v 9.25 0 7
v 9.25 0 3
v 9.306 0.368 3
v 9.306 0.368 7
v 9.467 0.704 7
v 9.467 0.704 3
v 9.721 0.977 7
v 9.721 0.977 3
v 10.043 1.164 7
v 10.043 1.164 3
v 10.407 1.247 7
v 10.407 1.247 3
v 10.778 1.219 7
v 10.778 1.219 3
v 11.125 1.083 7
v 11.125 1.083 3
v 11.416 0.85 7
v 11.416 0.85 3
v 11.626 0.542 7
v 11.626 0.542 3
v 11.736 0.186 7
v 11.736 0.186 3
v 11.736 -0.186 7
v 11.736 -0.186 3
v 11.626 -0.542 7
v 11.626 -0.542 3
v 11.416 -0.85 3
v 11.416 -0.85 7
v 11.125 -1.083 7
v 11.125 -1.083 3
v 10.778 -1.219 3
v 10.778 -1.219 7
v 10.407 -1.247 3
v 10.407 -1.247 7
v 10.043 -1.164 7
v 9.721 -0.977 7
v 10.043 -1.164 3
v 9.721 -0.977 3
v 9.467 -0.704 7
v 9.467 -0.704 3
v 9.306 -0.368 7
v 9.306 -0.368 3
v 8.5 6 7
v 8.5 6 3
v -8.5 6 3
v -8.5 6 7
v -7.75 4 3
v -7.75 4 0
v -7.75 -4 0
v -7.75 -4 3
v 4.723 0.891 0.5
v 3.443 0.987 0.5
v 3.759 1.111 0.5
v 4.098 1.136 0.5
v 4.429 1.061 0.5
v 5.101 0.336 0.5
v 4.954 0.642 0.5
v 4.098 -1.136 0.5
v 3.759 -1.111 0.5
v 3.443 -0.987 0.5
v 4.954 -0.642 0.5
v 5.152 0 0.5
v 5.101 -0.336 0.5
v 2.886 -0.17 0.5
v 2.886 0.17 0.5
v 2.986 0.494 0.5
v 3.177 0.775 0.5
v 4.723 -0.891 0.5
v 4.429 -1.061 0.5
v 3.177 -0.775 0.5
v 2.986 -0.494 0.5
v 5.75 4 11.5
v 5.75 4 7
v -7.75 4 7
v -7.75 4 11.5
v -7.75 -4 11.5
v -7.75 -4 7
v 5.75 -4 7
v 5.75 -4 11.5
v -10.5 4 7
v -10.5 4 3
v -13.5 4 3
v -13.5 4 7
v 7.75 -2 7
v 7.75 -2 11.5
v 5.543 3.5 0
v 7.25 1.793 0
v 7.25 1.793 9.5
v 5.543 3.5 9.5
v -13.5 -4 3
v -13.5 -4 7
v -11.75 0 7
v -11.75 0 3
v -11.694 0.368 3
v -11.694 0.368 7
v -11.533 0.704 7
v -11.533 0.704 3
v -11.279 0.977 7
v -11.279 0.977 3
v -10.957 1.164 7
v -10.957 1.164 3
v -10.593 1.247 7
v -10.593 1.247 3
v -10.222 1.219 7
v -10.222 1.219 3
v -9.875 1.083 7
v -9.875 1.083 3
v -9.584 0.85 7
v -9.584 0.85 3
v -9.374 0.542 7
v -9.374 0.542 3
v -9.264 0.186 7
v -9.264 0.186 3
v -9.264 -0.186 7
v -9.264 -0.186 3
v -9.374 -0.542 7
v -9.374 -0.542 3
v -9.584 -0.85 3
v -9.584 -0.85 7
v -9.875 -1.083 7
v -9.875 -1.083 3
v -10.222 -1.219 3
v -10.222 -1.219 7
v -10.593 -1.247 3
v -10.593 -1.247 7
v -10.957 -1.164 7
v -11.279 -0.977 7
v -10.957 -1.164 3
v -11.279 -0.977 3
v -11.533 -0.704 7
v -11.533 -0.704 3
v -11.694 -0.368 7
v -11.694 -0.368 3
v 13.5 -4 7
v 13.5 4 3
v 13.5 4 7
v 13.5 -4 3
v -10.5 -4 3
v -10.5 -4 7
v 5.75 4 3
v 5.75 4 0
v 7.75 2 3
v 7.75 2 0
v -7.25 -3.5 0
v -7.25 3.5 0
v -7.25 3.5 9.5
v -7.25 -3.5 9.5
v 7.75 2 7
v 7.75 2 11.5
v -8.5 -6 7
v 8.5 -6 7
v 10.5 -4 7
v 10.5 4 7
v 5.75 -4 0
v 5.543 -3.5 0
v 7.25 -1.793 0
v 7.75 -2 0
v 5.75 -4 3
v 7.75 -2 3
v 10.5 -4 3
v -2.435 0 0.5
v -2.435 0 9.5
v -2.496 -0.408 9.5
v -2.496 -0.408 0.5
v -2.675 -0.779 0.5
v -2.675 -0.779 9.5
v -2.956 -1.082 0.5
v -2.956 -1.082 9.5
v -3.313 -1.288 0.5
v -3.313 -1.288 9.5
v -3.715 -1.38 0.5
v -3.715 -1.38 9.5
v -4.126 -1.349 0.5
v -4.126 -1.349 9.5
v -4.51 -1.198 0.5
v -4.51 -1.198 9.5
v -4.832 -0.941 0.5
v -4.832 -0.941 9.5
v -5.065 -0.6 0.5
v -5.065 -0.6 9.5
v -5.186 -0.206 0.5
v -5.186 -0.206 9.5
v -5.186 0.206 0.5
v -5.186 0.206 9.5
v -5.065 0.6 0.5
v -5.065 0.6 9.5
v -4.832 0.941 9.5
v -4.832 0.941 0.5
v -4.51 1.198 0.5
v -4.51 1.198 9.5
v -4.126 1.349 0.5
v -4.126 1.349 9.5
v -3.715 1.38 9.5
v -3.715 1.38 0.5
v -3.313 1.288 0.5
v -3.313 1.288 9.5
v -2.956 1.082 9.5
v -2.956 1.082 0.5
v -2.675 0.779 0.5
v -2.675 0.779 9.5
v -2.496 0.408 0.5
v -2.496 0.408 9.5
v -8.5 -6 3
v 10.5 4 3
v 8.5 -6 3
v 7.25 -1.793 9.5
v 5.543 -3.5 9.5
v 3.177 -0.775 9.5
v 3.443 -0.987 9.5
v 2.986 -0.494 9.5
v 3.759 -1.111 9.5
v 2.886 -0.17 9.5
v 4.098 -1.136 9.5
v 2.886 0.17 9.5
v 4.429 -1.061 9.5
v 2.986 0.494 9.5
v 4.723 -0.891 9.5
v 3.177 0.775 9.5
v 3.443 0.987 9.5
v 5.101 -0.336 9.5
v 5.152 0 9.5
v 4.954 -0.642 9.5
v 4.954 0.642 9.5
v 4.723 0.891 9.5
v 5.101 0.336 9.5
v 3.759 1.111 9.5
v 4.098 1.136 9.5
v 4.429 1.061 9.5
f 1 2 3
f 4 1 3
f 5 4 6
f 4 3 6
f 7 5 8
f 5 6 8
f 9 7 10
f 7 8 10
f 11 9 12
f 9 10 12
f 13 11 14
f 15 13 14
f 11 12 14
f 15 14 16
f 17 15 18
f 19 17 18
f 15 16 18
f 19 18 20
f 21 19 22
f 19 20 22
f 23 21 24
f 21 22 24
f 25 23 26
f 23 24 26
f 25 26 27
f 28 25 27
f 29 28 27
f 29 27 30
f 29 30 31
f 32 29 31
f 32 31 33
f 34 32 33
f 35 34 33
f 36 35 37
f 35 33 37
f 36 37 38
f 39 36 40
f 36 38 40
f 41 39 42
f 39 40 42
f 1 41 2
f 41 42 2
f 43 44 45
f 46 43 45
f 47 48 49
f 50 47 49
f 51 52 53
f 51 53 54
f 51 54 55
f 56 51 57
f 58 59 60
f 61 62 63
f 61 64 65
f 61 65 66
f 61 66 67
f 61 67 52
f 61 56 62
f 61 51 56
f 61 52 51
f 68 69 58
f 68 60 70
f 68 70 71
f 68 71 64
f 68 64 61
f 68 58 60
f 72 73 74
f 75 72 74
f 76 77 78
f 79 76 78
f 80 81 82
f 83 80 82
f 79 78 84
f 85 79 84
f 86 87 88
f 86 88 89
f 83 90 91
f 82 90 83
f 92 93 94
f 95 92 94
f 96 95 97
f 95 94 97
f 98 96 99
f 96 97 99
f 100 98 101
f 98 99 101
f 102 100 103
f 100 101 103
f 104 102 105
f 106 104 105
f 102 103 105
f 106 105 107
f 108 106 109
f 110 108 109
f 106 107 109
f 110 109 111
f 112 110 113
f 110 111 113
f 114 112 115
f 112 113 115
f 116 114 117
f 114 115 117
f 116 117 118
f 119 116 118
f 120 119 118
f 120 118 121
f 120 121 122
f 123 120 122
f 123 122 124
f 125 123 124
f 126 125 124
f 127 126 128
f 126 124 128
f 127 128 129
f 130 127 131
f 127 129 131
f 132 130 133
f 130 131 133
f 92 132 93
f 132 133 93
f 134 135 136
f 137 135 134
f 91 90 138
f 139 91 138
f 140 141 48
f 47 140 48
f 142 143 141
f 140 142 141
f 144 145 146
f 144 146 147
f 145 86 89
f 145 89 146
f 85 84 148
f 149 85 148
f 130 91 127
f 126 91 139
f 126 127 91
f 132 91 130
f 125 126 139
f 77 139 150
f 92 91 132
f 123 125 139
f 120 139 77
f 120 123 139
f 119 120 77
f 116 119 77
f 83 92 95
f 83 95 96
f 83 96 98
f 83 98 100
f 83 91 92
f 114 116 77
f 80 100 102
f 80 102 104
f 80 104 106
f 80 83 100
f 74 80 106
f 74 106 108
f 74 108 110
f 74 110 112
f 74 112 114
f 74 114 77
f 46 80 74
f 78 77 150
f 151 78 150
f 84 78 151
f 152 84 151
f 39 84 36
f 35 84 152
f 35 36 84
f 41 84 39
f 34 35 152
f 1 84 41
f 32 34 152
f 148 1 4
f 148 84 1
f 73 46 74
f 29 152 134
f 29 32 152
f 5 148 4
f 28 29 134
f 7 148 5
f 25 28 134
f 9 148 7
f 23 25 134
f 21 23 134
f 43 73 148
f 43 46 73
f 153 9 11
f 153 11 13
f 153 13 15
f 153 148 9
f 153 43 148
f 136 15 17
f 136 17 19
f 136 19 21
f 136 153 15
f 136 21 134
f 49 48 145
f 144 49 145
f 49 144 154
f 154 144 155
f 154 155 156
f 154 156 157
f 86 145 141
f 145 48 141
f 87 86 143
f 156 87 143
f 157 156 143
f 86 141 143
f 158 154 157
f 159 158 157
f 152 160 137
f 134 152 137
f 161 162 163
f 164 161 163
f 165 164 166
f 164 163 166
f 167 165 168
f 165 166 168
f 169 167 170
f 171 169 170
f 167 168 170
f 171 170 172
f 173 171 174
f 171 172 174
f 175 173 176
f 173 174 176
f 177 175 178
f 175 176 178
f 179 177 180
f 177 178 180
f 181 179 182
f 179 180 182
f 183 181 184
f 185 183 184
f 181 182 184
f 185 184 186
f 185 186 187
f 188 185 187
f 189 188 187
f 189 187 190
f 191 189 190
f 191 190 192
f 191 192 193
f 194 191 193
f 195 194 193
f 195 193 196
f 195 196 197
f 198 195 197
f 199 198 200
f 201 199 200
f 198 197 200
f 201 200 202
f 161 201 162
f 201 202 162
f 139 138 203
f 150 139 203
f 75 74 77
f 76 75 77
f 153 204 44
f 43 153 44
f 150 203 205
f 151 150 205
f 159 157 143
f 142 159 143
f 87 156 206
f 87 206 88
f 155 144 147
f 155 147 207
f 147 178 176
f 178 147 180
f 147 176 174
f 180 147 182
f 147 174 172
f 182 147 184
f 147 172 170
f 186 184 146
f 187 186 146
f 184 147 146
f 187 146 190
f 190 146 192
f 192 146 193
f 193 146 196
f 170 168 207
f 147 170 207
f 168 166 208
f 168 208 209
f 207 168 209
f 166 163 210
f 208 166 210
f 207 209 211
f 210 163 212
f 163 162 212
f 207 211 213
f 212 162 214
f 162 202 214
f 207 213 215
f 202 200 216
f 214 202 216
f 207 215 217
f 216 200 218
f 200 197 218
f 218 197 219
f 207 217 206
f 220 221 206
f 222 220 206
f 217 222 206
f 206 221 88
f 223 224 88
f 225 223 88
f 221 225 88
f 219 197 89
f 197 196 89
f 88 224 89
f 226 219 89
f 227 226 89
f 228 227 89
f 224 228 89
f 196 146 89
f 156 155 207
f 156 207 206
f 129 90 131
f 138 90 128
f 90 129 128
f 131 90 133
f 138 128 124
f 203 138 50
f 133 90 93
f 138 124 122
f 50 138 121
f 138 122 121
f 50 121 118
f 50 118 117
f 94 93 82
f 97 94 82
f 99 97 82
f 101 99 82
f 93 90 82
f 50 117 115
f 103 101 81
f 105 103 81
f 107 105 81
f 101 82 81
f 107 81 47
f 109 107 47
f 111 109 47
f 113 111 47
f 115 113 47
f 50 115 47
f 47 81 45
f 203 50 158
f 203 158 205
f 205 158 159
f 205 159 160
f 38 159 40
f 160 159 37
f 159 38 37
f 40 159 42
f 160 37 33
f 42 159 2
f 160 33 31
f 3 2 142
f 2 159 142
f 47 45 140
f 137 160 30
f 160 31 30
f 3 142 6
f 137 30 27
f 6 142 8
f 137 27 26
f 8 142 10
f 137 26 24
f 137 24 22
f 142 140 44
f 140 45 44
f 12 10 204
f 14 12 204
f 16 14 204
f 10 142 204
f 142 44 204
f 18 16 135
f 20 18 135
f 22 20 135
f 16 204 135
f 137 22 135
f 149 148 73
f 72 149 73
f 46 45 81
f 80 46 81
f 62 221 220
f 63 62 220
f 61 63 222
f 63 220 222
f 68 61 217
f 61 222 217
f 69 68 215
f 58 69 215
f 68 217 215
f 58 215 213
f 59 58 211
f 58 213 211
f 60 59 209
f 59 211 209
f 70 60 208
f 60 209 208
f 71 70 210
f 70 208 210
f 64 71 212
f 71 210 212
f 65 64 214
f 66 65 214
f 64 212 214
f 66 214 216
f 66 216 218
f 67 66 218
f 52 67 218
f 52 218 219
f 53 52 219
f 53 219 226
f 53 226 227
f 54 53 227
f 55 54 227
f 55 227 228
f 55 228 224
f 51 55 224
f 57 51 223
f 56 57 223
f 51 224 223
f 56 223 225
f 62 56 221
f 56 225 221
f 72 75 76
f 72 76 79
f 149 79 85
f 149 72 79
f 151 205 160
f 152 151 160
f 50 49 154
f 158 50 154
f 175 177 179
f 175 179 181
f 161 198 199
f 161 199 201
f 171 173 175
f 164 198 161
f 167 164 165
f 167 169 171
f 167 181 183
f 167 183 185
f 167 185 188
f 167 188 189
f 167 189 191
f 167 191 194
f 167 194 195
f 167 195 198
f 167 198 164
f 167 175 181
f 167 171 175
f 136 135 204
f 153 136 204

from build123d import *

# Parameters (mm, degrees)
BOSS_EXTRUDE1_DEPTH = 11.5
SKETCH2_R           = 1.25
BOSS_EXTRUDE2_DEPTH = 4
BOSS_EXTRUDE3_DEPTH = 2
SKETCH4_R           = 1.139512492
SKETCH4_R_2         = 1.383403708
BOSS_EXTRUDE4_DEPTH = 9


with BuildPart() as part:
    # Sketch1 → Boss-Extrude1 (new body)
    with BuildSketch(Plane.XY):
        Polygon((5.75, -4), (7.75, -2), (7.75, 2), (5.75, 4), (-7.75, 4), (-7.75, -4), align=None)
        Polygon((-7.25, 3.5), (-7.25, -3.5), (5.542893219, -3.5), (7.25, -1.792893219), (7.25, 1.792893219), (5.542893219, 3.5), align=None, mode=Mode.SUBTRACT)
    extrude(amount=BOSS_EXTRUDE1_DEPTH)

    # Sketch2 → Boss-Extrude2 (add)
    with BuildSketch(Plane(origin=(0, 0, 3), x_dir=(-1, 0, 0), z_dir=(0, 0, -1))):
        Polygon((-13.5, 0), (-13.5, 4), (-10.5, 4), (-8.5, 6), (8.5, 6), (10.5, 4), (13.5, 4), (13.5, 0), (13.5, -4), (10.5, -4), (8.5, -6), (-8.5, -6), (-10.5, -4), (-13.5, -4), align=None)
        with Locations((-10.5, 0)):
            Circle(SKETCH2_R, mode=Mode.SUBTRACT)
        with Locations((10.5, 0)):
            Circle(SKETCH2_R, mode=Mode.SUBTRACT)
        Polygon((-5.75, -4), (7.75, -4), (7.75, 4), (-5.75, 4), (-7.75, 2), (-7.75, -2), align=None, mode=Mode.SUBTRACT)
    extrude(amount=-BOSS_EXTRUDE2_DEPTH)

    # Sketch3 → Boss-Extrude3 (add)
    with BuildSketch(Plane.XY.offset(11.5)):
        Polygon((-7.25, 3.5), (-7.25, -3.5), (5.542893219, -3.5), (7.25, -1.792893219), (7.25, 1.792893219), (5.542893219, 3.5), align=None)
    extrude(amount=-BOSS_EXTRUDE3_DEPTH)

    # Sketch4 → Boss-Extrude4 (add)
    with BuildSketch(Plane(origin=(0, 0, 9.5), x_dir=(-1, 0, 0), z_dir=(0, 0, -1))):
        with Locations(Location((-4.01250784, 0, 0), (0, 0, 180))):
            Circle(SKETCH4_R)
        with Locations(Location((3.818130298, 0, 0), (0, 0, 180))):
            Circle(SKETCH4_R_2)
    extrude(amount=BOSS_EXTRUDE4_DEPTH)


solid = part.part
